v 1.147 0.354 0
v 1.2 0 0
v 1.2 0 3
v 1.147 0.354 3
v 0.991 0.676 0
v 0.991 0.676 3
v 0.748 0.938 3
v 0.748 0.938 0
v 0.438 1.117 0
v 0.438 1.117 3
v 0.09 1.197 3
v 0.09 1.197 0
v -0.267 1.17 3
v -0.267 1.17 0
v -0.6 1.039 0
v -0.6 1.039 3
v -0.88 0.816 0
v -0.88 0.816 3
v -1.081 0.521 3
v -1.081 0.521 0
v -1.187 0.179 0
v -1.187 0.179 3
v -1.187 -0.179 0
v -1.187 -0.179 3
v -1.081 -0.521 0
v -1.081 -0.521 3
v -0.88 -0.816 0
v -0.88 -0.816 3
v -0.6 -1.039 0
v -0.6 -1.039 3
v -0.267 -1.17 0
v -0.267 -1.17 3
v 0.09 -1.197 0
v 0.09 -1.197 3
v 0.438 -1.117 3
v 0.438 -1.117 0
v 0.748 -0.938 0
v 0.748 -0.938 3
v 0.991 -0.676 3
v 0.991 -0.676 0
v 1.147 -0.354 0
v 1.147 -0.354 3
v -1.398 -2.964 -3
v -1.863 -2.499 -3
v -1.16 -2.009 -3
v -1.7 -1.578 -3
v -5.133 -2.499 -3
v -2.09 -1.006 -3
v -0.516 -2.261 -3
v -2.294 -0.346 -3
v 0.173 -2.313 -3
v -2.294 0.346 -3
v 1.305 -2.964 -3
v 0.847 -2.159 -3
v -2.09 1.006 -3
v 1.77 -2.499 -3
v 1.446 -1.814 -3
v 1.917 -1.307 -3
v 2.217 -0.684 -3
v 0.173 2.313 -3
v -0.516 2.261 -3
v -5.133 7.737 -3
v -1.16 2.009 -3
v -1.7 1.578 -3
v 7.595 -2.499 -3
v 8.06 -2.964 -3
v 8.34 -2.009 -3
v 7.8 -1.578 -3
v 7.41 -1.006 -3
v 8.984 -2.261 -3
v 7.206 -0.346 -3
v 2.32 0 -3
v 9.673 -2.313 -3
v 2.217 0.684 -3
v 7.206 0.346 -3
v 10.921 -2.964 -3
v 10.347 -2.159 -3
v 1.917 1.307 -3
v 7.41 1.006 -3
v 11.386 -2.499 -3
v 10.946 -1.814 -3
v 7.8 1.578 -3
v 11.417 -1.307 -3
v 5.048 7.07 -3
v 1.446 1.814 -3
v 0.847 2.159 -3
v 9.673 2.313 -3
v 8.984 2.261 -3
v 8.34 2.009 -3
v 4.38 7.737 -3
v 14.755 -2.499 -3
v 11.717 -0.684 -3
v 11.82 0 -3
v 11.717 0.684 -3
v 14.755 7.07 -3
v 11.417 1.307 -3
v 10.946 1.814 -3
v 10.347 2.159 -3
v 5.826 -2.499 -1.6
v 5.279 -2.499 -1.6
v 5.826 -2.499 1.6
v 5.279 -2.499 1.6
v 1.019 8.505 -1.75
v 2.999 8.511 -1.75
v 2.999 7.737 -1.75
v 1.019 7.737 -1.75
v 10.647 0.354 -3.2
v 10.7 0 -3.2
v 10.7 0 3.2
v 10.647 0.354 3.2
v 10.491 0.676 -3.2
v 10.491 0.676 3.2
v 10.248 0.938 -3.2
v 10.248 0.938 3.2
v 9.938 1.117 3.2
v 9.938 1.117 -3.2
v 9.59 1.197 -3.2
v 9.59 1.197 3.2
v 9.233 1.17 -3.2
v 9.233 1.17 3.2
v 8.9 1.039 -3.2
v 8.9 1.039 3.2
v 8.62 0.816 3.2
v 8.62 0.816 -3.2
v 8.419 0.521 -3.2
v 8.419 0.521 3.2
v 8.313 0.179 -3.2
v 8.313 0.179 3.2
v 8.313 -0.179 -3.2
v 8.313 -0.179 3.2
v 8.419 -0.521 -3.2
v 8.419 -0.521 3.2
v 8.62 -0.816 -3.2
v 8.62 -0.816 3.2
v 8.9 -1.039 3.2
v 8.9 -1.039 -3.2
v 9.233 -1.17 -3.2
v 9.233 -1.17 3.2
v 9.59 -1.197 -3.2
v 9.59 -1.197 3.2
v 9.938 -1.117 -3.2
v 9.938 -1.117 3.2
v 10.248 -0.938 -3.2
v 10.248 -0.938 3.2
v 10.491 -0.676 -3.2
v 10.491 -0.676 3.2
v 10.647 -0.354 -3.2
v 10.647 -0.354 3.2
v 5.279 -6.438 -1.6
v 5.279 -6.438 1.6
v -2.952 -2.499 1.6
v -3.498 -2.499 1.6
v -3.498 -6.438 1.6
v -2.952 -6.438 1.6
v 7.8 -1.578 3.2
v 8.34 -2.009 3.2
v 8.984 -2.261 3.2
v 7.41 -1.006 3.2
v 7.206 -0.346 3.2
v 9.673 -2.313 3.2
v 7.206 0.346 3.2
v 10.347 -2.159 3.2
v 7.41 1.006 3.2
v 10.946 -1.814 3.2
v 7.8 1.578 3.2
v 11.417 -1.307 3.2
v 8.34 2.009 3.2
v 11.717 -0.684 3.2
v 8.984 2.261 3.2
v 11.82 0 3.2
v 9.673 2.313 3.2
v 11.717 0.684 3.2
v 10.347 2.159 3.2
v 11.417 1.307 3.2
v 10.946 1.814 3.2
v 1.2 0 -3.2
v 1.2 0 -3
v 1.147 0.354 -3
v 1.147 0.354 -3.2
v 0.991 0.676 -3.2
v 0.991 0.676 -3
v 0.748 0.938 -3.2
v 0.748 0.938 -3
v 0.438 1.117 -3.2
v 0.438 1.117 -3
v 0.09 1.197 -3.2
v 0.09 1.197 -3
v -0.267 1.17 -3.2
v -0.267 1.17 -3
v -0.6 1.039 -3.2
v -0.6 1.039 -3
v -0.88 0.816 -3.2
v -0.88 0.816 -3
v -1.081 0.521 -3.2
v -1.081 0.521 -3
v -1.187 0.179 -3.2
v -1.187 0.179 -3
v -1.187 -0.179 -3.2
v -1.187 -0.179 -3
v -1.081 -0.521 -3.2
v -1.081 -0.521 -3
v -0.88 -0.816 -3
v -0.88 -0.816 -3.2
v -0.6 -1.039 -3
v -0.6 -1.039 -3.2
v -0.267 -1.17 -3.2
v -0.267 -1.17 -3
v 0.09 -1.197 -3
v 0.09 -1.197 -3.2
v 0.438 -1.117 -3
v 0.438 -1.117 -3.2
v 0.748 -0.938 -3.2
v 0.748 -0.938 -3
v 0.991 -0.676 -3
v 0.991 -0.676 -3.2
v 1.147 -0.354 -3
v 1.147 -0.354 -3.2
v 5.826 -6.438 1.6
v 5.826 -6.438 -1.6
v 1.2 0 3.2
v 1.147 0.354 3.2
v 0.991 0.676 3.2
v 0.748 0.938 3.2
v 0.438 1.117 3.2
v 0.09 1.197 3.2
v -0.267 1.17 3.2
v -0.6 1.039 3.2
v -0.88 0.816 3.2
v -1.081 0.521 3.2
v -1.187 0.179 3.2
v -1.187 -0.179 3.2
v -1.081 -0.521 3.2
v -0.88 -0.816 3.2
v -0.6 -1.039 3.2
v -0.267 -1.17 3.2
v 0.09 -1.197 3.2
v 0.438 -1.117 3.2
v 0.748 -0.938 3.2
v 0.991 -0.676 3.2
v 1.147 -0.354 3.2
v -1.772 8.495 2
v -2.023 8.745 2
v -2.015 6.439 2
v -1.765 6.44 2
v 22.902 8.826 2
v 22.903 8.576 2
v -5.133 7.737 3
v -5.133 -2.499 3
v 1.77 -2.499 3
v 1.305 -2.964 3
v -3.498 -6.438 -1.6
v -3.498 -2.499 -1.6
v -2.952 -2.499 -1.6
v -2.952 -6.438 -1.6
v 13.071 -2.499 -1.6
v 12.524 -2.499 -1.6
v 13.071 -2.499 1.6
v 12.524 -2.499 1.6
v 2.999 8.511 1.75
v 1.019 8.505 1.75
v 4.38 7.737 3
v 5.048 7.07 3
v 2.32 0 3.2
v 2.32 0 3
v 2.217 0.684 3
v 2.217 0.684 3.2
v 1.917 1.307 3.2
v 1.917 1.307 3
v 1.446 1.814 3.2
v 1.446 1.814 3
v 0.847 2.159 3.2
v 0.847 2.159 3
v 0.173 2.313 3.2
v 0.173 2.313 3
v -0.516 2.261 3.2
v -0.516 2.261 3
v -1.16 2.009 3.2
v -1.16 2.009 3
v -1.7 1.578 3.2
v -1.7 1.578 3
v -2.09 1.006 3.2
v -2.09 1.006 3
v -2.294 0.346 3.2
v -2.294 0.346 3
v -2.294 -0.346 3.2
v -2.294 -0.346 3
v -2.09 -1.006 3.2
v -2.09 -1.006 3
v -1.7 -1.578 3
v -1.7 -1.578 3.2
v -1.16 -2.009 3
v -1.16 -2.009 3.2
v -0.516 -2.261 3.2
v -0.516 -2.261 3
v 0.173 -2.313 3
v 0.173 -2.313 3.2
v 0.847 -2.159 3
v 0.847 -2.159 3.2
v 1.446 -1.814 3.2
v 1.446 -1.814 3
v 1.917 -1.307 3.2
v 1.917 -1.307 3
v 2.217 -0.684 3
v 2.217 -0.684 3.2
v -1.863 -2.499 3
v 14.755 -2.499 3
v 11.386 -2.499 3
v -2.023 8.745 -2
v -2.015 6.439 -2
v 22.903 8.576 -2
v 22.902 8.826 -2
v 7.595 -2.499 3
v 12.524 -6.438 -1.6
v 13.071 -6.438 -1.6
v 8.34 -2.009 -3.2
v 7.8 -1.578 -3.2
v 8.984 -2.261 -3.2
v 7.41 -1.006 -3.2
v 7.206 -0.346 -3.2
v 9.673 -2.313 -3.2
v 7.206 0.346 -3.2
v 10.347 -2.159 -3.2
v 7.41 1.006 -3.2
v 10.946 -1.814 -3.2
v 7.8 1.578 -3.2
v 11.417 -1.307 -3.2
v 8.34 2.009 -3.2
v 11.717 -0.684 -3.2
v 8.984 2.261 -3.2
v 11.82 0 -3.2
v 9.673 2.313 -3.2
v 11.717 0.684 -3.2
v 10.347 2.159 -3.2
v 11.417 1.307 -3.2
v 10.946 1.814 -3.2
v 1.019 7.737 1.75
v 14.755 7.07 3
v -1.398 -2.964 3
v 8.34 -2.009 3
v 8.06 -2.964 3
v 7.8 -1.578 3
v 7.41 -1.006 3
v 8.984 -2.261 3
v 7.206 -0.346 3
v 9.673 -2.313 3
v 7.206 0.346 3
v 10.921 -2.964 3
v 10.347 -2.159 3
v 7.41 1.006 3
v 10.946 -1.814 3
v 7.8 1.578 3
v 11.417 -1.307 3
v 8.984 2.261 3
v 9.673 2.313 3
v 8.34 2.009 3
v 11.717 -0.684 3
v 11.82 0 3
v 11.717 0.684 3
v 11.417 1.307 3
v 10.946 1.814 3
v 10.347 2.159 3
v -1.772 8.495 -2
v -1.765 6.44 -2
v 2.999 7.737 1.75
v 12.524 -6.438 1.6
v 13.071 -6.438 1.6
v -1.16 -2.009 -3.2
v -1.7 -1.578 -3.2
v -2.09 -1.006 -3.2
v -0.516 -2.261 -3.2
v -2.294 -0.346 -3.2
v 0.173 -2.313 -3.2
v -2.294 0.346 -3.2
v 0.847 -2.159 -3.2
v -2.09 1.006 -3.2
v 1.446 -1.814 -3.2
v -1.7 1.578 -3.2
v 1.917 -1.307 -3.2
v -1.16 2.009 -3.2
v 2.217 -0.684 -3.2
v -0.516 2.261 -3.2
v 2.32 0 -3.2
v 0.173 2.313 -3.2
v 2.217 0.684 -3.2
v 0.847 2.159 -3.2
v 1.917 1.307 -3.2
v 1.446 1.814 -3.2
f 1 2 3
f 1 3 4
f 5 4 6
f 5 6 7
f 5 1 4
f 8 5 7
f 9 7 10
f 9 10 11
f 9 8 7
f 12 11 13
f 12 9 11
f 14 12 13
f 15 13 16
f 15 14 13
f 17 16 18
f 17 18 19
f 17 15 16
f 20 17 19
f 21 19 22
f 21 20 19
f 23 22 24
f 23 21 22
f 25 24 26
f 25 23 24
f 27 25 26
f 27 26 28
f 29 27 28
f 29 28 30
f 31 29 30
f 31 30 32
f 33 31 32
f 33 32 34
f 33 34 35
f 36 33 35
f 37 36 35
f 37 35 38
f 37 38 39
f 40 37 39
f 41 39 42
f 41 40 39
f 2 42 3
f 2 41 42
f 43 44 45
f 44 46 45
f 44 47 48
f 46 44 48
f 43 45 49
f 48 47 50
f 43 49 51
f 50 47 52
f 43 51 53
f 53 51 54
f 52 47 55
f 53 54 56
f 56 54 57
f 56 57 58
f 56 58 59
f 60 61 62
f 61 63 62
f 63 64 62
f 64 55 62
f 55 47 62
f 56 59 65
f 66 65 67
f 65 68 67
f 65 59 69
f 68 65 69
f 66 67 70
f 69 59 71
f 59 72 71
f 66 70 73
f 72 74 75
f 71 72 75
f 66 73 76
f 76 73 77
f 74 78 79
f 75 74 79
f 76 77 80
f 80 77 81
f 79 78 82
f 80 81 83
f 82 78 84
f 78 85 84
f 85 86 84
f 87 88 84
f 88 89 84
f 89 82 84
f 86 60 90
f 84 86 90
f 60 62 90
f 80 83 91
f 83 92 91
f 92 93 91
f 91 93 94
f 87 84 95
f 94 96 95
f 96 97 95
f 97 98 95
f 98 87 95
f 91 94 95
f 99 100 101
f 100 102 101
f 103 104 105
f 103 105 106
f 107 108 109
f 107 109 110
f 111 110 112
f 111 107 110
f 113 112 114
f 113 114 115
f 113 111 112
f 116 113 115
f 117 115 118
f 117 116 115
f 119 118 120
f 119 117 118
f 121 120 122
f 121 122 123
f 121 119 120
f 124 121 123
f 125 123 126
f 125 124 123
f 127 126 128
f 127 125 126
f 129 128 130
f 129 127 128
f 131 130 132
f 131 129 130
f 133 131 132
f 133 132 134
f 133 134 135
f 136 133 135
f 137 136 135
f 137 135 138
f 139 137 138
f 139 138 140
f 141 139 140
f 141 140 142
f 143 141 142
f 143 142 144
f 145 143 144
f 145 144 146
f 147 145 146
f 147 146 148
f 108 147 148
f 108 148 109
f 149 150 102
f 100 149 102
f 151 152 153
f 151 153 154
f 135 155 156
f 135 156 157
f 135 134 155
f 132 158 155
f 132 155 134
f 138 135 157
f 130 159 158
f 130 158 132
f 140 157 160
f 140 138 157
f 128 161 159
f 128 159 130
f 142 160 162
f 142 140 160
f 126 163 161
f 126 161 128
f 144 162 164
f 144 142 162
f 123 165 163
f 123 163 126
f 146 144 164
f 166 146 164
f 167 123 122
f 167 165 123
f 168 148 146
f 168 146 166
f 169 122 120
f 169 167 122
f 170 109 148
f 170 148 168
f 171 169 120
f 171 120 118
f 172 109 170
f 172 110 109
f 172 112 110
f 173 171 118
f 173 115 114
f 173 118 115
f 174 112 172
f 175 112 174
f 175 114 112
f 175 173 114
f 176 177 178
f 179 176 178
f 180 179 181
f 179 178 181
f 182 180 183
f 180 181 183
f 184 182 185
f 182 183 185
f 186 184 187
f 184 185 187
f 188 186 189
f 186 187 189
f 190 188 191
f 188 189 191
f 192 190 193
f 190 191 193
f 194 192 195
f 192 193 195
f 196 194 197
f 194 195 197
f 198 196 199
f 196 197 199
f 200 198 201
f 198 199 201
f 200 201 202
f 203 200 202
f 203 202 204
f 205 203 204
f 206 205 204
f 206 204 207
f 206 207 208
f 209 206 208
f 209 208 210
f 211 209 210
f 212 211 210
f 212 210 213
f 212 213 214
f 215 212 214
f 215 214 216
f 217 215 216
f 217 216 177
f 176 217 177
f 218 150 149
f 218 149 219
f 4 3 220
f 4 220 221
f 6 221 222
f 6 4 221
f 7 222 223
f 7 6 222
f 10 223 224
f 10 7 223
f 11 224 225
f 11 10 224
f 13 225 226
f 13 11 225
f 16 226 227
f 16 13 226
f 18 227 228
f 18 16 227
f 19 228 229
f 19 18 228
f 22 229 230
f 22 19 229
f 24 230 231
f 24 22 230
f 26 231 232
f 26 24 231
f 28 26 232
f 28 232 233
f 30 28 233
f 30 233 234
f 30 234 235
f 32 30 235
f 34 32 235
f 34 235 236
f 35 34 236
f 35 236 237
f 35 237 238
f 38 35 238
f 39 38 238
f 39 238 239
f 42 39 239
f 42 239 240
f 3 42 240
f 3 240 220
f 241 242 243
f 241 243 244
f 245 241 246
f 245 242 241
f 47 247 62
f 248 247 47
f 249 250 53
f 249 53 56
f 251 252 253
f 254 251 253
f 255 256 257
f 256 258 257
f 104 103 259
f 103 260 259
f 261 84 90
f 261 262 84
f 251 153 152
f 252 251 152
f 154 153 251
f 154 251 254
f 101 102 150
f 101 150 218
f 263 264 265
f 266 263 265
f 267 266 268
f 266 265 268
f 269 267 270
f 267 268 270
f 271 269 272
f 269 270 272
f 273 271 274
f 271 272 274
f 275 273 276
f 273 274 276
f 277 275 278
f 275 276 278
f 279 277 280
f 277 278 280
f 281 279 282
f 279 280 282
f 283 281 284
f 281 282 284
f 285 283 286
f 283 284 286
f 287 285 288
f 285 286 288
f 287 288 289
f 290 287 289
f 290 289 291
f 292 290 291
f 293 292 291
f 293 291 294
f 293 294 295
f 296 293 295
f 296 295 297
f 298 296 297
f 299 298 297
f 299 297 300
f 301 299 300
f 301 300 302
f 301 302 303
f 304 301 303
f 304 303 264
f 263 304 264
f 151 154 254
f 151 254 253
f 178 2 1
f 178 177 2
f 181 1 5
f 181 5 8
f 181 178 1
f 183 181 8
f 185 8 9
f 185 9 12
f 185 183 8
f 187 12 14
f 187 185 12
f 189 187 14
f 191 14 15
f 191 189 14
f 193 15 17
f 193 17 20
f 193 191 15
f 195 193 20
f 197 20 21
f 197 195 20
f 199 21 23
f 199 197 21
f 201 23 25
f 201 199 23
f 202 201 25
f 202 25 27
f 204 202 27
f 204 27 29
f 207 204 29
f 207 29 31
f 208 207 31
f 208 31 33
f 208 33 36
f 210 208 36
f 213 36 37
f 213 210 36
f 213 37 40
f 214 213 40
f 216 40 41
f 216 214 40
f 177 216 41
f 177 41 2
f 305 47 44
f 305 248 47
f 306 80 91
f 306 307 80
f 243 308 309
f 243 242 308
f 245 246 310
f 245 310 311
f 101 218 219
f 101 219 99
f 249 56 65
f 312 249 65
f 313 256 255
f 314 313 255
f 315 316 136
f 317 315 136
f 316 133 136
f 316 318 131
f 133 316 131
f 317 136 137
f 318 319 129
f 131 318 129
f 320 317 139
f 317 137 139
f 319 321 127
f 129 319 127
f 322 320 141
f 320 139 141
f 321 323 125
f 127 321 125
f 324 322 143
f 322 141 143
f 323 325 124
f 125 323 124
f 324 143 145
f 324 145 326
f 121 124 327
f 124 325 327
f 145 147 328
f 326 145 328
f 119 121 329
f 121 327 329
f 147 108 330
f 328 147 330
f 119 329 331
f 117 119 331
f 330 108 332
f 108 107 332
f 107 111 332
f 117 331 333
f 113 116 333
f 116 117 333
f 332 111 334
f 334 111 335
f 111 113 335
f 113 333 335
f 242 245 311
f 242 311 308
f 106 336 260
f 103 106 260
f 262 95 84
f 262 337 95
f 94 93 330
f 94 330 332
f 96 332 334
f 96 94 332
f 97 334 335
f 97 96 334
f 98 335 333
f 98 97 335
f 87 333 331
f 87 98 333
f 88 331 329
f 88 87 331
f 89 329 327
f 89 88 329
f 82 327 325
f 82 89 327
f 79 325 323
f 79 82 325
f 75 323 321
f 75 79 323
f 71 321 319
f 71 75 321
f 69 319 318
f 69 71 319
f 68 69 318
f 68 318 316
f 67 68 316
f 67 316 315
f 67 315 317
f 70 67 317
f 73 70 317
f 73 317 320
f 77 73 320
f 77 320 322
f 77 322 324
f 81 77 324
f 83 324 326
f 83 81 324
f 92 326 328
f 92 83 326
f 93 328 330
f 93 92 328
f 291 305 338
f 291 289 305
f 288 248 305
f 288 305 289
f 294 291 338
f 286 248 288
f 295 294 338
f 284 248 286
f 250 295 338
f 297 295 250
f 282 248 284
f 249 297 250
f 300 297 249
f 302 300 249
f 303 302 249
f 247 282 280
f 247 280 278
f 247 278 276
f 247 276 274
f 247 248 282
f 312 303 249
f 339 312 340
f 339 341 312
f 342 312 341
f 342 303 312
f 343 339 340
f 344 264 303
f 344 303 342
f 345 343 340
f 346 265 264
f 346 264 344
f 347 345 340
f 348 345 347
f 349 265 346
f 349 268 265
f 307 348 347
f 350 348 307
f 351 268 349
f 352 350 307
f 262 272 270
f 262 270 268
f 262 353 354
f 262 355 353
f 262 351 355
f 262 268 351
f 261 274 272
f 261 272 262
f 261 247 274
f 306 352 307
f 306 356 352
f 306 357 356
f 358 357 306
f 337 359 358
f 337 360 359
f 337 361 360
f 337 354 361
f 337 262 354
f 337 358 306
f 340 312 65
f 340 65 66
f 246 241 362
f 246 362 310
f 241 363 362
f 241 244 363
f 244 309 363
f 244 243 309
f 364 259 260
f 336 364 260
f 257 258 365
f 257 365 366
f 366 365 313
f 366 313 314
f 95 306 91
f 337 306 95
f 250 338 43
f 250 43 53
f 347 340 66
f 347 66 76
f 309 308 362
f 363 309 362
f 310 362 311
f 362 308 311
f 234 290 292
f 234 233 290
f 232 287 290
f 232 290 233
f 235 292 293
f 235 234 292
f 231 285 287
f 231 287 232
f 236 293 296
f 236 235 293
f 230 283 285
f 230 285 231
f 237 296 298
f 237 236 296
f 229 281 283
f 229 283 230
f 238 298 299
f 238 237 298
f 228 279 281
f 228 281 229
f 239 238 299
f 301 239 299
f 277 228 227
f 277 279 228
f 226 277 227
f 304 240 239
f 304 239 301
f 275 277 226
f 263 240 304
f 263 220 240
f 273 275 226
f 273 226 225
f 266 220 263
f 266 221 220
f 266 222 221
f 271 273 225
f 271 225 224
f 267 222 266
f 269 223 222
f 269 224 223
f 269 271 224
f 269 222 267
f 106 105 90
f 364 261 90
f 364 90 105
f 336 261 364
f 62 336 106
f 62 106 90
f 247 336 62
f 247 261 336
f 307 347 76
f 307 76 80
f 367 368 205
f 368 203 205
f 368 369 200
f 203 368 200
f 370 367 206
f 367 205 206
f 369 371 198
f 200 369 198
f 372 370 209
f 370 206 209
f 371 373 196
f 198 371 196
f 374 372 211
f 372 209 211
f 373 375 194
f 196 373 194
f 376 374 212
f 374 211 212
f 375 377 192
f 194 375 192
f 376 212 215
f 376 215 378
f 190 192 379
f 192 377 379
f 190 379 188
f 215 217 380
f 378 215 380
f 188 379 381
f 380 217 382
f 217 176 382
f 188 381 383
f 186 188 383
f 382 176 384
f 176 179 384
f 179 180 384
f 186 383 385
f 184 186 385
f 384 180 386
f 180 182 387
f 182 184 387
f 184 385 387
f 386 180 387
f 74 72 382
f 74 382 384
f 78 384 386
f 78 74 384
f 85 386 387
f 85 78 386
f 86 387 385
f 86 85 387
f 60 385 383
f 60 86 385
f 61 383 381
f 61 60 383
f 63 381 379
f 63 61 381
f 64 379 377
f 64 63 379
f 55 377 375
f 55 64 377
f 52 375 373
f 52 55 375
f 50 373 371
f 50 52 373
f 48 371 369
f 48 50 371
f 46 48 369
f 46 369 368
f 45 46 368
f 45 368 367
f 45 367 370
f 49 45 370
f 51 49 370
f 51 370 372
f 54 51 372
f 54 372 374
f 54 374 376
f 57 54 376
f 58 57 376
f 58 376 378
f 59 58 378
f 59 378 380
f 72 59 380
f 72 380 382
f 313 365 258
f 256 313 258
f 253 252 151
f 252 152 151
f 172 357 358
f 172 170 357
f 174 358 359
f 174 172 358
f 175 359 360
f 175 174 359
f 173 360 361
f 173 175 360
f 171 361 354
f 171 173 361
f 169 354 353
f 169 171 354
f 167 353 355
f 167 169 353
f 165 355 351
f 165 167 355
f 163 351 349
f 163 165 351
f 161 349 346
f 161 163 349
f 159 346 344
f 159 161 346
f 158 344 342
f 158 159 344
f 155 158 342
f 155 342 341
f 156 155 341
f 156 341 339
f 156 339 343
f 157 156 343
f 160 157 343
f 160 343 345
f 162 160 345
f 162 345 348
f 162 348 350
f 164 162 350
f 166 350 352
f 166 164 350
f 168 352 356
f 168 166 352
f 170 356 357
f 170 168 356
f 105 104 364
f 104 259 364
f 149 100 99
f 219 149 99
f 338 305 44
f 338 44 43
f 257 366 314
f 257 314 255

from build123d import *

# Parameters (mm, degrees)
SKETCH2_R             = 1.2
BOSS_EXTRUDE1_DEPTH   = 3
SKETCH3_R             = 2.319639751
SKETCH3_R_2           = 1.2
BOSS_EXTRUDE2_DEPTH   = 3.2
EXTRUDE_THIN1_DEPTH   = 2
BOSS_EXTRUDE3_DEPTH   = 1.75
SKETCH6_W             = 0.546409637
SKETCH6_H             = 3.938984301
BOSS_EXTRUDE4_DEPTH   = 1.6
BOSS_EXTRUDE4_2_DEPTH = 1.6
SKETCH6_W_2           = 0.546409636
BOSS_EXTRUDE4_3_DEPTH = 1.6


with BuildPart() as part:
    # Sketch2 → Boss-Extrude1 (new body, symmetric)
    with BuildSketch(Plane.XY):
        Polygon((-5.132917841, -2.498802599), (-1.863393107, -2.498802599), (-1.397707667, -2.964488039), (1.304774393, -2.964488039), (1.770459833, -2.498802599), (7.594789334, -2.498802599), (8.060474774, -2.964488039), (10.920734529, -2.964488039), (11.386419969, -2.498802599), (14.75505715, -2.498802599), (14.75505715, 7.069677676), (5.047500126, 7.069677676), (4.379931735, 7.737246067), (-5.132917841, 7.737246067), align=None)
        Circle(SKETCH2_R, mode=Mode.SUBTRACT)
        with Locations((9.5, 0)):
            Circle(SKETCH2_R, mode=Mode.SUBTRACT)
    extrude(amount=BOSS_EXTRUDE1_DEPTH, both=True)

    # Sketch3 → Boss-Extrude2 (add, symmetric)
    with BuildSketch(Plane.XY):
        Circle(SKETCH3_R)
        Circle(SKETCH3_R_2, mode=Mode.SUBTRACT)
        with Locations((9.5, 0)):
            Circle(SKETCH3_R)
        with Locations((9.5, 0)):
            Circle(SKETCH3_R_2, mode=Mode.SUBTRACT)
    extrude(amount=BOSS_EXTRUDE2_DEPTH, both=True)

    # Sketch4 → Boss-Extrude3 (add, symmetric)
    with BuildSketch(Plane.XY):
        Polygon((1.01895614, 7.737246067), (1.01895614, 8.504625171), (2.998833668, 8.511100498), (2.998833668, 7.737246067), align=None)
    extrude(amount=BOSS_EXTRUDE3_DEPTH, both=True)


with BuildPart() as body_2:
    # Sketch5 → Extrude-Thin1 (new body, symmetric)
    with BuildSketch(Plane.XY):
        Polygon((-1.76526318, 6.439708473), (-1.77198678, 8.495497198), (22.902881251, 8.576198069), (22.902063613, 8.826196732), (-2.022803081, 8.744678223), (-2.015261843, 6.438890835), align=None)
    extrude(amount=EXTRUDE_THIN1_DEPTH, both=True)


with BuildPart() as body_3:
    # Sketch6 → Boss-Extrude4 (new body, symmetric)
    with BuildSketch(Plane.XY):
        with Locations((-3.224950656, -4.46829475)):
            Rectangle(SKETCH6_W, SKETCH6_H)
    extrude(amount=BOSS_EXTRUDE4_DEPTH, both=True)


with BuildPart() as body_4:
    # Sketch6 → Boss-Extrude4 2 (new body, symmetric)
    with BuildSketch(Plane.XY):
        with Locations((5.552309937, -4.46829475)):
            Rectangle(SKETCH6_W, SKETCH6_H)
    extrude(amount=BOSS_EXTRUDE4_2_DEPTH, both=True)


with BuildPart() as body_5:
    # Sketch6 → Boss-Extrude4 3 (new body, symmetric)
    with BuildSketch(Plane.XY):
        with Locations((12.797533741, -4.46829475)):
            Rectangle(SKETCH6_W_2, SKETCH6_H)
    extrude(amount=BOSS_EXTRUDE4_3_DEPTH, both=True)


solid = Compound([part.part, body_2.part, body_3.part, body_4.part, body_5.part])
